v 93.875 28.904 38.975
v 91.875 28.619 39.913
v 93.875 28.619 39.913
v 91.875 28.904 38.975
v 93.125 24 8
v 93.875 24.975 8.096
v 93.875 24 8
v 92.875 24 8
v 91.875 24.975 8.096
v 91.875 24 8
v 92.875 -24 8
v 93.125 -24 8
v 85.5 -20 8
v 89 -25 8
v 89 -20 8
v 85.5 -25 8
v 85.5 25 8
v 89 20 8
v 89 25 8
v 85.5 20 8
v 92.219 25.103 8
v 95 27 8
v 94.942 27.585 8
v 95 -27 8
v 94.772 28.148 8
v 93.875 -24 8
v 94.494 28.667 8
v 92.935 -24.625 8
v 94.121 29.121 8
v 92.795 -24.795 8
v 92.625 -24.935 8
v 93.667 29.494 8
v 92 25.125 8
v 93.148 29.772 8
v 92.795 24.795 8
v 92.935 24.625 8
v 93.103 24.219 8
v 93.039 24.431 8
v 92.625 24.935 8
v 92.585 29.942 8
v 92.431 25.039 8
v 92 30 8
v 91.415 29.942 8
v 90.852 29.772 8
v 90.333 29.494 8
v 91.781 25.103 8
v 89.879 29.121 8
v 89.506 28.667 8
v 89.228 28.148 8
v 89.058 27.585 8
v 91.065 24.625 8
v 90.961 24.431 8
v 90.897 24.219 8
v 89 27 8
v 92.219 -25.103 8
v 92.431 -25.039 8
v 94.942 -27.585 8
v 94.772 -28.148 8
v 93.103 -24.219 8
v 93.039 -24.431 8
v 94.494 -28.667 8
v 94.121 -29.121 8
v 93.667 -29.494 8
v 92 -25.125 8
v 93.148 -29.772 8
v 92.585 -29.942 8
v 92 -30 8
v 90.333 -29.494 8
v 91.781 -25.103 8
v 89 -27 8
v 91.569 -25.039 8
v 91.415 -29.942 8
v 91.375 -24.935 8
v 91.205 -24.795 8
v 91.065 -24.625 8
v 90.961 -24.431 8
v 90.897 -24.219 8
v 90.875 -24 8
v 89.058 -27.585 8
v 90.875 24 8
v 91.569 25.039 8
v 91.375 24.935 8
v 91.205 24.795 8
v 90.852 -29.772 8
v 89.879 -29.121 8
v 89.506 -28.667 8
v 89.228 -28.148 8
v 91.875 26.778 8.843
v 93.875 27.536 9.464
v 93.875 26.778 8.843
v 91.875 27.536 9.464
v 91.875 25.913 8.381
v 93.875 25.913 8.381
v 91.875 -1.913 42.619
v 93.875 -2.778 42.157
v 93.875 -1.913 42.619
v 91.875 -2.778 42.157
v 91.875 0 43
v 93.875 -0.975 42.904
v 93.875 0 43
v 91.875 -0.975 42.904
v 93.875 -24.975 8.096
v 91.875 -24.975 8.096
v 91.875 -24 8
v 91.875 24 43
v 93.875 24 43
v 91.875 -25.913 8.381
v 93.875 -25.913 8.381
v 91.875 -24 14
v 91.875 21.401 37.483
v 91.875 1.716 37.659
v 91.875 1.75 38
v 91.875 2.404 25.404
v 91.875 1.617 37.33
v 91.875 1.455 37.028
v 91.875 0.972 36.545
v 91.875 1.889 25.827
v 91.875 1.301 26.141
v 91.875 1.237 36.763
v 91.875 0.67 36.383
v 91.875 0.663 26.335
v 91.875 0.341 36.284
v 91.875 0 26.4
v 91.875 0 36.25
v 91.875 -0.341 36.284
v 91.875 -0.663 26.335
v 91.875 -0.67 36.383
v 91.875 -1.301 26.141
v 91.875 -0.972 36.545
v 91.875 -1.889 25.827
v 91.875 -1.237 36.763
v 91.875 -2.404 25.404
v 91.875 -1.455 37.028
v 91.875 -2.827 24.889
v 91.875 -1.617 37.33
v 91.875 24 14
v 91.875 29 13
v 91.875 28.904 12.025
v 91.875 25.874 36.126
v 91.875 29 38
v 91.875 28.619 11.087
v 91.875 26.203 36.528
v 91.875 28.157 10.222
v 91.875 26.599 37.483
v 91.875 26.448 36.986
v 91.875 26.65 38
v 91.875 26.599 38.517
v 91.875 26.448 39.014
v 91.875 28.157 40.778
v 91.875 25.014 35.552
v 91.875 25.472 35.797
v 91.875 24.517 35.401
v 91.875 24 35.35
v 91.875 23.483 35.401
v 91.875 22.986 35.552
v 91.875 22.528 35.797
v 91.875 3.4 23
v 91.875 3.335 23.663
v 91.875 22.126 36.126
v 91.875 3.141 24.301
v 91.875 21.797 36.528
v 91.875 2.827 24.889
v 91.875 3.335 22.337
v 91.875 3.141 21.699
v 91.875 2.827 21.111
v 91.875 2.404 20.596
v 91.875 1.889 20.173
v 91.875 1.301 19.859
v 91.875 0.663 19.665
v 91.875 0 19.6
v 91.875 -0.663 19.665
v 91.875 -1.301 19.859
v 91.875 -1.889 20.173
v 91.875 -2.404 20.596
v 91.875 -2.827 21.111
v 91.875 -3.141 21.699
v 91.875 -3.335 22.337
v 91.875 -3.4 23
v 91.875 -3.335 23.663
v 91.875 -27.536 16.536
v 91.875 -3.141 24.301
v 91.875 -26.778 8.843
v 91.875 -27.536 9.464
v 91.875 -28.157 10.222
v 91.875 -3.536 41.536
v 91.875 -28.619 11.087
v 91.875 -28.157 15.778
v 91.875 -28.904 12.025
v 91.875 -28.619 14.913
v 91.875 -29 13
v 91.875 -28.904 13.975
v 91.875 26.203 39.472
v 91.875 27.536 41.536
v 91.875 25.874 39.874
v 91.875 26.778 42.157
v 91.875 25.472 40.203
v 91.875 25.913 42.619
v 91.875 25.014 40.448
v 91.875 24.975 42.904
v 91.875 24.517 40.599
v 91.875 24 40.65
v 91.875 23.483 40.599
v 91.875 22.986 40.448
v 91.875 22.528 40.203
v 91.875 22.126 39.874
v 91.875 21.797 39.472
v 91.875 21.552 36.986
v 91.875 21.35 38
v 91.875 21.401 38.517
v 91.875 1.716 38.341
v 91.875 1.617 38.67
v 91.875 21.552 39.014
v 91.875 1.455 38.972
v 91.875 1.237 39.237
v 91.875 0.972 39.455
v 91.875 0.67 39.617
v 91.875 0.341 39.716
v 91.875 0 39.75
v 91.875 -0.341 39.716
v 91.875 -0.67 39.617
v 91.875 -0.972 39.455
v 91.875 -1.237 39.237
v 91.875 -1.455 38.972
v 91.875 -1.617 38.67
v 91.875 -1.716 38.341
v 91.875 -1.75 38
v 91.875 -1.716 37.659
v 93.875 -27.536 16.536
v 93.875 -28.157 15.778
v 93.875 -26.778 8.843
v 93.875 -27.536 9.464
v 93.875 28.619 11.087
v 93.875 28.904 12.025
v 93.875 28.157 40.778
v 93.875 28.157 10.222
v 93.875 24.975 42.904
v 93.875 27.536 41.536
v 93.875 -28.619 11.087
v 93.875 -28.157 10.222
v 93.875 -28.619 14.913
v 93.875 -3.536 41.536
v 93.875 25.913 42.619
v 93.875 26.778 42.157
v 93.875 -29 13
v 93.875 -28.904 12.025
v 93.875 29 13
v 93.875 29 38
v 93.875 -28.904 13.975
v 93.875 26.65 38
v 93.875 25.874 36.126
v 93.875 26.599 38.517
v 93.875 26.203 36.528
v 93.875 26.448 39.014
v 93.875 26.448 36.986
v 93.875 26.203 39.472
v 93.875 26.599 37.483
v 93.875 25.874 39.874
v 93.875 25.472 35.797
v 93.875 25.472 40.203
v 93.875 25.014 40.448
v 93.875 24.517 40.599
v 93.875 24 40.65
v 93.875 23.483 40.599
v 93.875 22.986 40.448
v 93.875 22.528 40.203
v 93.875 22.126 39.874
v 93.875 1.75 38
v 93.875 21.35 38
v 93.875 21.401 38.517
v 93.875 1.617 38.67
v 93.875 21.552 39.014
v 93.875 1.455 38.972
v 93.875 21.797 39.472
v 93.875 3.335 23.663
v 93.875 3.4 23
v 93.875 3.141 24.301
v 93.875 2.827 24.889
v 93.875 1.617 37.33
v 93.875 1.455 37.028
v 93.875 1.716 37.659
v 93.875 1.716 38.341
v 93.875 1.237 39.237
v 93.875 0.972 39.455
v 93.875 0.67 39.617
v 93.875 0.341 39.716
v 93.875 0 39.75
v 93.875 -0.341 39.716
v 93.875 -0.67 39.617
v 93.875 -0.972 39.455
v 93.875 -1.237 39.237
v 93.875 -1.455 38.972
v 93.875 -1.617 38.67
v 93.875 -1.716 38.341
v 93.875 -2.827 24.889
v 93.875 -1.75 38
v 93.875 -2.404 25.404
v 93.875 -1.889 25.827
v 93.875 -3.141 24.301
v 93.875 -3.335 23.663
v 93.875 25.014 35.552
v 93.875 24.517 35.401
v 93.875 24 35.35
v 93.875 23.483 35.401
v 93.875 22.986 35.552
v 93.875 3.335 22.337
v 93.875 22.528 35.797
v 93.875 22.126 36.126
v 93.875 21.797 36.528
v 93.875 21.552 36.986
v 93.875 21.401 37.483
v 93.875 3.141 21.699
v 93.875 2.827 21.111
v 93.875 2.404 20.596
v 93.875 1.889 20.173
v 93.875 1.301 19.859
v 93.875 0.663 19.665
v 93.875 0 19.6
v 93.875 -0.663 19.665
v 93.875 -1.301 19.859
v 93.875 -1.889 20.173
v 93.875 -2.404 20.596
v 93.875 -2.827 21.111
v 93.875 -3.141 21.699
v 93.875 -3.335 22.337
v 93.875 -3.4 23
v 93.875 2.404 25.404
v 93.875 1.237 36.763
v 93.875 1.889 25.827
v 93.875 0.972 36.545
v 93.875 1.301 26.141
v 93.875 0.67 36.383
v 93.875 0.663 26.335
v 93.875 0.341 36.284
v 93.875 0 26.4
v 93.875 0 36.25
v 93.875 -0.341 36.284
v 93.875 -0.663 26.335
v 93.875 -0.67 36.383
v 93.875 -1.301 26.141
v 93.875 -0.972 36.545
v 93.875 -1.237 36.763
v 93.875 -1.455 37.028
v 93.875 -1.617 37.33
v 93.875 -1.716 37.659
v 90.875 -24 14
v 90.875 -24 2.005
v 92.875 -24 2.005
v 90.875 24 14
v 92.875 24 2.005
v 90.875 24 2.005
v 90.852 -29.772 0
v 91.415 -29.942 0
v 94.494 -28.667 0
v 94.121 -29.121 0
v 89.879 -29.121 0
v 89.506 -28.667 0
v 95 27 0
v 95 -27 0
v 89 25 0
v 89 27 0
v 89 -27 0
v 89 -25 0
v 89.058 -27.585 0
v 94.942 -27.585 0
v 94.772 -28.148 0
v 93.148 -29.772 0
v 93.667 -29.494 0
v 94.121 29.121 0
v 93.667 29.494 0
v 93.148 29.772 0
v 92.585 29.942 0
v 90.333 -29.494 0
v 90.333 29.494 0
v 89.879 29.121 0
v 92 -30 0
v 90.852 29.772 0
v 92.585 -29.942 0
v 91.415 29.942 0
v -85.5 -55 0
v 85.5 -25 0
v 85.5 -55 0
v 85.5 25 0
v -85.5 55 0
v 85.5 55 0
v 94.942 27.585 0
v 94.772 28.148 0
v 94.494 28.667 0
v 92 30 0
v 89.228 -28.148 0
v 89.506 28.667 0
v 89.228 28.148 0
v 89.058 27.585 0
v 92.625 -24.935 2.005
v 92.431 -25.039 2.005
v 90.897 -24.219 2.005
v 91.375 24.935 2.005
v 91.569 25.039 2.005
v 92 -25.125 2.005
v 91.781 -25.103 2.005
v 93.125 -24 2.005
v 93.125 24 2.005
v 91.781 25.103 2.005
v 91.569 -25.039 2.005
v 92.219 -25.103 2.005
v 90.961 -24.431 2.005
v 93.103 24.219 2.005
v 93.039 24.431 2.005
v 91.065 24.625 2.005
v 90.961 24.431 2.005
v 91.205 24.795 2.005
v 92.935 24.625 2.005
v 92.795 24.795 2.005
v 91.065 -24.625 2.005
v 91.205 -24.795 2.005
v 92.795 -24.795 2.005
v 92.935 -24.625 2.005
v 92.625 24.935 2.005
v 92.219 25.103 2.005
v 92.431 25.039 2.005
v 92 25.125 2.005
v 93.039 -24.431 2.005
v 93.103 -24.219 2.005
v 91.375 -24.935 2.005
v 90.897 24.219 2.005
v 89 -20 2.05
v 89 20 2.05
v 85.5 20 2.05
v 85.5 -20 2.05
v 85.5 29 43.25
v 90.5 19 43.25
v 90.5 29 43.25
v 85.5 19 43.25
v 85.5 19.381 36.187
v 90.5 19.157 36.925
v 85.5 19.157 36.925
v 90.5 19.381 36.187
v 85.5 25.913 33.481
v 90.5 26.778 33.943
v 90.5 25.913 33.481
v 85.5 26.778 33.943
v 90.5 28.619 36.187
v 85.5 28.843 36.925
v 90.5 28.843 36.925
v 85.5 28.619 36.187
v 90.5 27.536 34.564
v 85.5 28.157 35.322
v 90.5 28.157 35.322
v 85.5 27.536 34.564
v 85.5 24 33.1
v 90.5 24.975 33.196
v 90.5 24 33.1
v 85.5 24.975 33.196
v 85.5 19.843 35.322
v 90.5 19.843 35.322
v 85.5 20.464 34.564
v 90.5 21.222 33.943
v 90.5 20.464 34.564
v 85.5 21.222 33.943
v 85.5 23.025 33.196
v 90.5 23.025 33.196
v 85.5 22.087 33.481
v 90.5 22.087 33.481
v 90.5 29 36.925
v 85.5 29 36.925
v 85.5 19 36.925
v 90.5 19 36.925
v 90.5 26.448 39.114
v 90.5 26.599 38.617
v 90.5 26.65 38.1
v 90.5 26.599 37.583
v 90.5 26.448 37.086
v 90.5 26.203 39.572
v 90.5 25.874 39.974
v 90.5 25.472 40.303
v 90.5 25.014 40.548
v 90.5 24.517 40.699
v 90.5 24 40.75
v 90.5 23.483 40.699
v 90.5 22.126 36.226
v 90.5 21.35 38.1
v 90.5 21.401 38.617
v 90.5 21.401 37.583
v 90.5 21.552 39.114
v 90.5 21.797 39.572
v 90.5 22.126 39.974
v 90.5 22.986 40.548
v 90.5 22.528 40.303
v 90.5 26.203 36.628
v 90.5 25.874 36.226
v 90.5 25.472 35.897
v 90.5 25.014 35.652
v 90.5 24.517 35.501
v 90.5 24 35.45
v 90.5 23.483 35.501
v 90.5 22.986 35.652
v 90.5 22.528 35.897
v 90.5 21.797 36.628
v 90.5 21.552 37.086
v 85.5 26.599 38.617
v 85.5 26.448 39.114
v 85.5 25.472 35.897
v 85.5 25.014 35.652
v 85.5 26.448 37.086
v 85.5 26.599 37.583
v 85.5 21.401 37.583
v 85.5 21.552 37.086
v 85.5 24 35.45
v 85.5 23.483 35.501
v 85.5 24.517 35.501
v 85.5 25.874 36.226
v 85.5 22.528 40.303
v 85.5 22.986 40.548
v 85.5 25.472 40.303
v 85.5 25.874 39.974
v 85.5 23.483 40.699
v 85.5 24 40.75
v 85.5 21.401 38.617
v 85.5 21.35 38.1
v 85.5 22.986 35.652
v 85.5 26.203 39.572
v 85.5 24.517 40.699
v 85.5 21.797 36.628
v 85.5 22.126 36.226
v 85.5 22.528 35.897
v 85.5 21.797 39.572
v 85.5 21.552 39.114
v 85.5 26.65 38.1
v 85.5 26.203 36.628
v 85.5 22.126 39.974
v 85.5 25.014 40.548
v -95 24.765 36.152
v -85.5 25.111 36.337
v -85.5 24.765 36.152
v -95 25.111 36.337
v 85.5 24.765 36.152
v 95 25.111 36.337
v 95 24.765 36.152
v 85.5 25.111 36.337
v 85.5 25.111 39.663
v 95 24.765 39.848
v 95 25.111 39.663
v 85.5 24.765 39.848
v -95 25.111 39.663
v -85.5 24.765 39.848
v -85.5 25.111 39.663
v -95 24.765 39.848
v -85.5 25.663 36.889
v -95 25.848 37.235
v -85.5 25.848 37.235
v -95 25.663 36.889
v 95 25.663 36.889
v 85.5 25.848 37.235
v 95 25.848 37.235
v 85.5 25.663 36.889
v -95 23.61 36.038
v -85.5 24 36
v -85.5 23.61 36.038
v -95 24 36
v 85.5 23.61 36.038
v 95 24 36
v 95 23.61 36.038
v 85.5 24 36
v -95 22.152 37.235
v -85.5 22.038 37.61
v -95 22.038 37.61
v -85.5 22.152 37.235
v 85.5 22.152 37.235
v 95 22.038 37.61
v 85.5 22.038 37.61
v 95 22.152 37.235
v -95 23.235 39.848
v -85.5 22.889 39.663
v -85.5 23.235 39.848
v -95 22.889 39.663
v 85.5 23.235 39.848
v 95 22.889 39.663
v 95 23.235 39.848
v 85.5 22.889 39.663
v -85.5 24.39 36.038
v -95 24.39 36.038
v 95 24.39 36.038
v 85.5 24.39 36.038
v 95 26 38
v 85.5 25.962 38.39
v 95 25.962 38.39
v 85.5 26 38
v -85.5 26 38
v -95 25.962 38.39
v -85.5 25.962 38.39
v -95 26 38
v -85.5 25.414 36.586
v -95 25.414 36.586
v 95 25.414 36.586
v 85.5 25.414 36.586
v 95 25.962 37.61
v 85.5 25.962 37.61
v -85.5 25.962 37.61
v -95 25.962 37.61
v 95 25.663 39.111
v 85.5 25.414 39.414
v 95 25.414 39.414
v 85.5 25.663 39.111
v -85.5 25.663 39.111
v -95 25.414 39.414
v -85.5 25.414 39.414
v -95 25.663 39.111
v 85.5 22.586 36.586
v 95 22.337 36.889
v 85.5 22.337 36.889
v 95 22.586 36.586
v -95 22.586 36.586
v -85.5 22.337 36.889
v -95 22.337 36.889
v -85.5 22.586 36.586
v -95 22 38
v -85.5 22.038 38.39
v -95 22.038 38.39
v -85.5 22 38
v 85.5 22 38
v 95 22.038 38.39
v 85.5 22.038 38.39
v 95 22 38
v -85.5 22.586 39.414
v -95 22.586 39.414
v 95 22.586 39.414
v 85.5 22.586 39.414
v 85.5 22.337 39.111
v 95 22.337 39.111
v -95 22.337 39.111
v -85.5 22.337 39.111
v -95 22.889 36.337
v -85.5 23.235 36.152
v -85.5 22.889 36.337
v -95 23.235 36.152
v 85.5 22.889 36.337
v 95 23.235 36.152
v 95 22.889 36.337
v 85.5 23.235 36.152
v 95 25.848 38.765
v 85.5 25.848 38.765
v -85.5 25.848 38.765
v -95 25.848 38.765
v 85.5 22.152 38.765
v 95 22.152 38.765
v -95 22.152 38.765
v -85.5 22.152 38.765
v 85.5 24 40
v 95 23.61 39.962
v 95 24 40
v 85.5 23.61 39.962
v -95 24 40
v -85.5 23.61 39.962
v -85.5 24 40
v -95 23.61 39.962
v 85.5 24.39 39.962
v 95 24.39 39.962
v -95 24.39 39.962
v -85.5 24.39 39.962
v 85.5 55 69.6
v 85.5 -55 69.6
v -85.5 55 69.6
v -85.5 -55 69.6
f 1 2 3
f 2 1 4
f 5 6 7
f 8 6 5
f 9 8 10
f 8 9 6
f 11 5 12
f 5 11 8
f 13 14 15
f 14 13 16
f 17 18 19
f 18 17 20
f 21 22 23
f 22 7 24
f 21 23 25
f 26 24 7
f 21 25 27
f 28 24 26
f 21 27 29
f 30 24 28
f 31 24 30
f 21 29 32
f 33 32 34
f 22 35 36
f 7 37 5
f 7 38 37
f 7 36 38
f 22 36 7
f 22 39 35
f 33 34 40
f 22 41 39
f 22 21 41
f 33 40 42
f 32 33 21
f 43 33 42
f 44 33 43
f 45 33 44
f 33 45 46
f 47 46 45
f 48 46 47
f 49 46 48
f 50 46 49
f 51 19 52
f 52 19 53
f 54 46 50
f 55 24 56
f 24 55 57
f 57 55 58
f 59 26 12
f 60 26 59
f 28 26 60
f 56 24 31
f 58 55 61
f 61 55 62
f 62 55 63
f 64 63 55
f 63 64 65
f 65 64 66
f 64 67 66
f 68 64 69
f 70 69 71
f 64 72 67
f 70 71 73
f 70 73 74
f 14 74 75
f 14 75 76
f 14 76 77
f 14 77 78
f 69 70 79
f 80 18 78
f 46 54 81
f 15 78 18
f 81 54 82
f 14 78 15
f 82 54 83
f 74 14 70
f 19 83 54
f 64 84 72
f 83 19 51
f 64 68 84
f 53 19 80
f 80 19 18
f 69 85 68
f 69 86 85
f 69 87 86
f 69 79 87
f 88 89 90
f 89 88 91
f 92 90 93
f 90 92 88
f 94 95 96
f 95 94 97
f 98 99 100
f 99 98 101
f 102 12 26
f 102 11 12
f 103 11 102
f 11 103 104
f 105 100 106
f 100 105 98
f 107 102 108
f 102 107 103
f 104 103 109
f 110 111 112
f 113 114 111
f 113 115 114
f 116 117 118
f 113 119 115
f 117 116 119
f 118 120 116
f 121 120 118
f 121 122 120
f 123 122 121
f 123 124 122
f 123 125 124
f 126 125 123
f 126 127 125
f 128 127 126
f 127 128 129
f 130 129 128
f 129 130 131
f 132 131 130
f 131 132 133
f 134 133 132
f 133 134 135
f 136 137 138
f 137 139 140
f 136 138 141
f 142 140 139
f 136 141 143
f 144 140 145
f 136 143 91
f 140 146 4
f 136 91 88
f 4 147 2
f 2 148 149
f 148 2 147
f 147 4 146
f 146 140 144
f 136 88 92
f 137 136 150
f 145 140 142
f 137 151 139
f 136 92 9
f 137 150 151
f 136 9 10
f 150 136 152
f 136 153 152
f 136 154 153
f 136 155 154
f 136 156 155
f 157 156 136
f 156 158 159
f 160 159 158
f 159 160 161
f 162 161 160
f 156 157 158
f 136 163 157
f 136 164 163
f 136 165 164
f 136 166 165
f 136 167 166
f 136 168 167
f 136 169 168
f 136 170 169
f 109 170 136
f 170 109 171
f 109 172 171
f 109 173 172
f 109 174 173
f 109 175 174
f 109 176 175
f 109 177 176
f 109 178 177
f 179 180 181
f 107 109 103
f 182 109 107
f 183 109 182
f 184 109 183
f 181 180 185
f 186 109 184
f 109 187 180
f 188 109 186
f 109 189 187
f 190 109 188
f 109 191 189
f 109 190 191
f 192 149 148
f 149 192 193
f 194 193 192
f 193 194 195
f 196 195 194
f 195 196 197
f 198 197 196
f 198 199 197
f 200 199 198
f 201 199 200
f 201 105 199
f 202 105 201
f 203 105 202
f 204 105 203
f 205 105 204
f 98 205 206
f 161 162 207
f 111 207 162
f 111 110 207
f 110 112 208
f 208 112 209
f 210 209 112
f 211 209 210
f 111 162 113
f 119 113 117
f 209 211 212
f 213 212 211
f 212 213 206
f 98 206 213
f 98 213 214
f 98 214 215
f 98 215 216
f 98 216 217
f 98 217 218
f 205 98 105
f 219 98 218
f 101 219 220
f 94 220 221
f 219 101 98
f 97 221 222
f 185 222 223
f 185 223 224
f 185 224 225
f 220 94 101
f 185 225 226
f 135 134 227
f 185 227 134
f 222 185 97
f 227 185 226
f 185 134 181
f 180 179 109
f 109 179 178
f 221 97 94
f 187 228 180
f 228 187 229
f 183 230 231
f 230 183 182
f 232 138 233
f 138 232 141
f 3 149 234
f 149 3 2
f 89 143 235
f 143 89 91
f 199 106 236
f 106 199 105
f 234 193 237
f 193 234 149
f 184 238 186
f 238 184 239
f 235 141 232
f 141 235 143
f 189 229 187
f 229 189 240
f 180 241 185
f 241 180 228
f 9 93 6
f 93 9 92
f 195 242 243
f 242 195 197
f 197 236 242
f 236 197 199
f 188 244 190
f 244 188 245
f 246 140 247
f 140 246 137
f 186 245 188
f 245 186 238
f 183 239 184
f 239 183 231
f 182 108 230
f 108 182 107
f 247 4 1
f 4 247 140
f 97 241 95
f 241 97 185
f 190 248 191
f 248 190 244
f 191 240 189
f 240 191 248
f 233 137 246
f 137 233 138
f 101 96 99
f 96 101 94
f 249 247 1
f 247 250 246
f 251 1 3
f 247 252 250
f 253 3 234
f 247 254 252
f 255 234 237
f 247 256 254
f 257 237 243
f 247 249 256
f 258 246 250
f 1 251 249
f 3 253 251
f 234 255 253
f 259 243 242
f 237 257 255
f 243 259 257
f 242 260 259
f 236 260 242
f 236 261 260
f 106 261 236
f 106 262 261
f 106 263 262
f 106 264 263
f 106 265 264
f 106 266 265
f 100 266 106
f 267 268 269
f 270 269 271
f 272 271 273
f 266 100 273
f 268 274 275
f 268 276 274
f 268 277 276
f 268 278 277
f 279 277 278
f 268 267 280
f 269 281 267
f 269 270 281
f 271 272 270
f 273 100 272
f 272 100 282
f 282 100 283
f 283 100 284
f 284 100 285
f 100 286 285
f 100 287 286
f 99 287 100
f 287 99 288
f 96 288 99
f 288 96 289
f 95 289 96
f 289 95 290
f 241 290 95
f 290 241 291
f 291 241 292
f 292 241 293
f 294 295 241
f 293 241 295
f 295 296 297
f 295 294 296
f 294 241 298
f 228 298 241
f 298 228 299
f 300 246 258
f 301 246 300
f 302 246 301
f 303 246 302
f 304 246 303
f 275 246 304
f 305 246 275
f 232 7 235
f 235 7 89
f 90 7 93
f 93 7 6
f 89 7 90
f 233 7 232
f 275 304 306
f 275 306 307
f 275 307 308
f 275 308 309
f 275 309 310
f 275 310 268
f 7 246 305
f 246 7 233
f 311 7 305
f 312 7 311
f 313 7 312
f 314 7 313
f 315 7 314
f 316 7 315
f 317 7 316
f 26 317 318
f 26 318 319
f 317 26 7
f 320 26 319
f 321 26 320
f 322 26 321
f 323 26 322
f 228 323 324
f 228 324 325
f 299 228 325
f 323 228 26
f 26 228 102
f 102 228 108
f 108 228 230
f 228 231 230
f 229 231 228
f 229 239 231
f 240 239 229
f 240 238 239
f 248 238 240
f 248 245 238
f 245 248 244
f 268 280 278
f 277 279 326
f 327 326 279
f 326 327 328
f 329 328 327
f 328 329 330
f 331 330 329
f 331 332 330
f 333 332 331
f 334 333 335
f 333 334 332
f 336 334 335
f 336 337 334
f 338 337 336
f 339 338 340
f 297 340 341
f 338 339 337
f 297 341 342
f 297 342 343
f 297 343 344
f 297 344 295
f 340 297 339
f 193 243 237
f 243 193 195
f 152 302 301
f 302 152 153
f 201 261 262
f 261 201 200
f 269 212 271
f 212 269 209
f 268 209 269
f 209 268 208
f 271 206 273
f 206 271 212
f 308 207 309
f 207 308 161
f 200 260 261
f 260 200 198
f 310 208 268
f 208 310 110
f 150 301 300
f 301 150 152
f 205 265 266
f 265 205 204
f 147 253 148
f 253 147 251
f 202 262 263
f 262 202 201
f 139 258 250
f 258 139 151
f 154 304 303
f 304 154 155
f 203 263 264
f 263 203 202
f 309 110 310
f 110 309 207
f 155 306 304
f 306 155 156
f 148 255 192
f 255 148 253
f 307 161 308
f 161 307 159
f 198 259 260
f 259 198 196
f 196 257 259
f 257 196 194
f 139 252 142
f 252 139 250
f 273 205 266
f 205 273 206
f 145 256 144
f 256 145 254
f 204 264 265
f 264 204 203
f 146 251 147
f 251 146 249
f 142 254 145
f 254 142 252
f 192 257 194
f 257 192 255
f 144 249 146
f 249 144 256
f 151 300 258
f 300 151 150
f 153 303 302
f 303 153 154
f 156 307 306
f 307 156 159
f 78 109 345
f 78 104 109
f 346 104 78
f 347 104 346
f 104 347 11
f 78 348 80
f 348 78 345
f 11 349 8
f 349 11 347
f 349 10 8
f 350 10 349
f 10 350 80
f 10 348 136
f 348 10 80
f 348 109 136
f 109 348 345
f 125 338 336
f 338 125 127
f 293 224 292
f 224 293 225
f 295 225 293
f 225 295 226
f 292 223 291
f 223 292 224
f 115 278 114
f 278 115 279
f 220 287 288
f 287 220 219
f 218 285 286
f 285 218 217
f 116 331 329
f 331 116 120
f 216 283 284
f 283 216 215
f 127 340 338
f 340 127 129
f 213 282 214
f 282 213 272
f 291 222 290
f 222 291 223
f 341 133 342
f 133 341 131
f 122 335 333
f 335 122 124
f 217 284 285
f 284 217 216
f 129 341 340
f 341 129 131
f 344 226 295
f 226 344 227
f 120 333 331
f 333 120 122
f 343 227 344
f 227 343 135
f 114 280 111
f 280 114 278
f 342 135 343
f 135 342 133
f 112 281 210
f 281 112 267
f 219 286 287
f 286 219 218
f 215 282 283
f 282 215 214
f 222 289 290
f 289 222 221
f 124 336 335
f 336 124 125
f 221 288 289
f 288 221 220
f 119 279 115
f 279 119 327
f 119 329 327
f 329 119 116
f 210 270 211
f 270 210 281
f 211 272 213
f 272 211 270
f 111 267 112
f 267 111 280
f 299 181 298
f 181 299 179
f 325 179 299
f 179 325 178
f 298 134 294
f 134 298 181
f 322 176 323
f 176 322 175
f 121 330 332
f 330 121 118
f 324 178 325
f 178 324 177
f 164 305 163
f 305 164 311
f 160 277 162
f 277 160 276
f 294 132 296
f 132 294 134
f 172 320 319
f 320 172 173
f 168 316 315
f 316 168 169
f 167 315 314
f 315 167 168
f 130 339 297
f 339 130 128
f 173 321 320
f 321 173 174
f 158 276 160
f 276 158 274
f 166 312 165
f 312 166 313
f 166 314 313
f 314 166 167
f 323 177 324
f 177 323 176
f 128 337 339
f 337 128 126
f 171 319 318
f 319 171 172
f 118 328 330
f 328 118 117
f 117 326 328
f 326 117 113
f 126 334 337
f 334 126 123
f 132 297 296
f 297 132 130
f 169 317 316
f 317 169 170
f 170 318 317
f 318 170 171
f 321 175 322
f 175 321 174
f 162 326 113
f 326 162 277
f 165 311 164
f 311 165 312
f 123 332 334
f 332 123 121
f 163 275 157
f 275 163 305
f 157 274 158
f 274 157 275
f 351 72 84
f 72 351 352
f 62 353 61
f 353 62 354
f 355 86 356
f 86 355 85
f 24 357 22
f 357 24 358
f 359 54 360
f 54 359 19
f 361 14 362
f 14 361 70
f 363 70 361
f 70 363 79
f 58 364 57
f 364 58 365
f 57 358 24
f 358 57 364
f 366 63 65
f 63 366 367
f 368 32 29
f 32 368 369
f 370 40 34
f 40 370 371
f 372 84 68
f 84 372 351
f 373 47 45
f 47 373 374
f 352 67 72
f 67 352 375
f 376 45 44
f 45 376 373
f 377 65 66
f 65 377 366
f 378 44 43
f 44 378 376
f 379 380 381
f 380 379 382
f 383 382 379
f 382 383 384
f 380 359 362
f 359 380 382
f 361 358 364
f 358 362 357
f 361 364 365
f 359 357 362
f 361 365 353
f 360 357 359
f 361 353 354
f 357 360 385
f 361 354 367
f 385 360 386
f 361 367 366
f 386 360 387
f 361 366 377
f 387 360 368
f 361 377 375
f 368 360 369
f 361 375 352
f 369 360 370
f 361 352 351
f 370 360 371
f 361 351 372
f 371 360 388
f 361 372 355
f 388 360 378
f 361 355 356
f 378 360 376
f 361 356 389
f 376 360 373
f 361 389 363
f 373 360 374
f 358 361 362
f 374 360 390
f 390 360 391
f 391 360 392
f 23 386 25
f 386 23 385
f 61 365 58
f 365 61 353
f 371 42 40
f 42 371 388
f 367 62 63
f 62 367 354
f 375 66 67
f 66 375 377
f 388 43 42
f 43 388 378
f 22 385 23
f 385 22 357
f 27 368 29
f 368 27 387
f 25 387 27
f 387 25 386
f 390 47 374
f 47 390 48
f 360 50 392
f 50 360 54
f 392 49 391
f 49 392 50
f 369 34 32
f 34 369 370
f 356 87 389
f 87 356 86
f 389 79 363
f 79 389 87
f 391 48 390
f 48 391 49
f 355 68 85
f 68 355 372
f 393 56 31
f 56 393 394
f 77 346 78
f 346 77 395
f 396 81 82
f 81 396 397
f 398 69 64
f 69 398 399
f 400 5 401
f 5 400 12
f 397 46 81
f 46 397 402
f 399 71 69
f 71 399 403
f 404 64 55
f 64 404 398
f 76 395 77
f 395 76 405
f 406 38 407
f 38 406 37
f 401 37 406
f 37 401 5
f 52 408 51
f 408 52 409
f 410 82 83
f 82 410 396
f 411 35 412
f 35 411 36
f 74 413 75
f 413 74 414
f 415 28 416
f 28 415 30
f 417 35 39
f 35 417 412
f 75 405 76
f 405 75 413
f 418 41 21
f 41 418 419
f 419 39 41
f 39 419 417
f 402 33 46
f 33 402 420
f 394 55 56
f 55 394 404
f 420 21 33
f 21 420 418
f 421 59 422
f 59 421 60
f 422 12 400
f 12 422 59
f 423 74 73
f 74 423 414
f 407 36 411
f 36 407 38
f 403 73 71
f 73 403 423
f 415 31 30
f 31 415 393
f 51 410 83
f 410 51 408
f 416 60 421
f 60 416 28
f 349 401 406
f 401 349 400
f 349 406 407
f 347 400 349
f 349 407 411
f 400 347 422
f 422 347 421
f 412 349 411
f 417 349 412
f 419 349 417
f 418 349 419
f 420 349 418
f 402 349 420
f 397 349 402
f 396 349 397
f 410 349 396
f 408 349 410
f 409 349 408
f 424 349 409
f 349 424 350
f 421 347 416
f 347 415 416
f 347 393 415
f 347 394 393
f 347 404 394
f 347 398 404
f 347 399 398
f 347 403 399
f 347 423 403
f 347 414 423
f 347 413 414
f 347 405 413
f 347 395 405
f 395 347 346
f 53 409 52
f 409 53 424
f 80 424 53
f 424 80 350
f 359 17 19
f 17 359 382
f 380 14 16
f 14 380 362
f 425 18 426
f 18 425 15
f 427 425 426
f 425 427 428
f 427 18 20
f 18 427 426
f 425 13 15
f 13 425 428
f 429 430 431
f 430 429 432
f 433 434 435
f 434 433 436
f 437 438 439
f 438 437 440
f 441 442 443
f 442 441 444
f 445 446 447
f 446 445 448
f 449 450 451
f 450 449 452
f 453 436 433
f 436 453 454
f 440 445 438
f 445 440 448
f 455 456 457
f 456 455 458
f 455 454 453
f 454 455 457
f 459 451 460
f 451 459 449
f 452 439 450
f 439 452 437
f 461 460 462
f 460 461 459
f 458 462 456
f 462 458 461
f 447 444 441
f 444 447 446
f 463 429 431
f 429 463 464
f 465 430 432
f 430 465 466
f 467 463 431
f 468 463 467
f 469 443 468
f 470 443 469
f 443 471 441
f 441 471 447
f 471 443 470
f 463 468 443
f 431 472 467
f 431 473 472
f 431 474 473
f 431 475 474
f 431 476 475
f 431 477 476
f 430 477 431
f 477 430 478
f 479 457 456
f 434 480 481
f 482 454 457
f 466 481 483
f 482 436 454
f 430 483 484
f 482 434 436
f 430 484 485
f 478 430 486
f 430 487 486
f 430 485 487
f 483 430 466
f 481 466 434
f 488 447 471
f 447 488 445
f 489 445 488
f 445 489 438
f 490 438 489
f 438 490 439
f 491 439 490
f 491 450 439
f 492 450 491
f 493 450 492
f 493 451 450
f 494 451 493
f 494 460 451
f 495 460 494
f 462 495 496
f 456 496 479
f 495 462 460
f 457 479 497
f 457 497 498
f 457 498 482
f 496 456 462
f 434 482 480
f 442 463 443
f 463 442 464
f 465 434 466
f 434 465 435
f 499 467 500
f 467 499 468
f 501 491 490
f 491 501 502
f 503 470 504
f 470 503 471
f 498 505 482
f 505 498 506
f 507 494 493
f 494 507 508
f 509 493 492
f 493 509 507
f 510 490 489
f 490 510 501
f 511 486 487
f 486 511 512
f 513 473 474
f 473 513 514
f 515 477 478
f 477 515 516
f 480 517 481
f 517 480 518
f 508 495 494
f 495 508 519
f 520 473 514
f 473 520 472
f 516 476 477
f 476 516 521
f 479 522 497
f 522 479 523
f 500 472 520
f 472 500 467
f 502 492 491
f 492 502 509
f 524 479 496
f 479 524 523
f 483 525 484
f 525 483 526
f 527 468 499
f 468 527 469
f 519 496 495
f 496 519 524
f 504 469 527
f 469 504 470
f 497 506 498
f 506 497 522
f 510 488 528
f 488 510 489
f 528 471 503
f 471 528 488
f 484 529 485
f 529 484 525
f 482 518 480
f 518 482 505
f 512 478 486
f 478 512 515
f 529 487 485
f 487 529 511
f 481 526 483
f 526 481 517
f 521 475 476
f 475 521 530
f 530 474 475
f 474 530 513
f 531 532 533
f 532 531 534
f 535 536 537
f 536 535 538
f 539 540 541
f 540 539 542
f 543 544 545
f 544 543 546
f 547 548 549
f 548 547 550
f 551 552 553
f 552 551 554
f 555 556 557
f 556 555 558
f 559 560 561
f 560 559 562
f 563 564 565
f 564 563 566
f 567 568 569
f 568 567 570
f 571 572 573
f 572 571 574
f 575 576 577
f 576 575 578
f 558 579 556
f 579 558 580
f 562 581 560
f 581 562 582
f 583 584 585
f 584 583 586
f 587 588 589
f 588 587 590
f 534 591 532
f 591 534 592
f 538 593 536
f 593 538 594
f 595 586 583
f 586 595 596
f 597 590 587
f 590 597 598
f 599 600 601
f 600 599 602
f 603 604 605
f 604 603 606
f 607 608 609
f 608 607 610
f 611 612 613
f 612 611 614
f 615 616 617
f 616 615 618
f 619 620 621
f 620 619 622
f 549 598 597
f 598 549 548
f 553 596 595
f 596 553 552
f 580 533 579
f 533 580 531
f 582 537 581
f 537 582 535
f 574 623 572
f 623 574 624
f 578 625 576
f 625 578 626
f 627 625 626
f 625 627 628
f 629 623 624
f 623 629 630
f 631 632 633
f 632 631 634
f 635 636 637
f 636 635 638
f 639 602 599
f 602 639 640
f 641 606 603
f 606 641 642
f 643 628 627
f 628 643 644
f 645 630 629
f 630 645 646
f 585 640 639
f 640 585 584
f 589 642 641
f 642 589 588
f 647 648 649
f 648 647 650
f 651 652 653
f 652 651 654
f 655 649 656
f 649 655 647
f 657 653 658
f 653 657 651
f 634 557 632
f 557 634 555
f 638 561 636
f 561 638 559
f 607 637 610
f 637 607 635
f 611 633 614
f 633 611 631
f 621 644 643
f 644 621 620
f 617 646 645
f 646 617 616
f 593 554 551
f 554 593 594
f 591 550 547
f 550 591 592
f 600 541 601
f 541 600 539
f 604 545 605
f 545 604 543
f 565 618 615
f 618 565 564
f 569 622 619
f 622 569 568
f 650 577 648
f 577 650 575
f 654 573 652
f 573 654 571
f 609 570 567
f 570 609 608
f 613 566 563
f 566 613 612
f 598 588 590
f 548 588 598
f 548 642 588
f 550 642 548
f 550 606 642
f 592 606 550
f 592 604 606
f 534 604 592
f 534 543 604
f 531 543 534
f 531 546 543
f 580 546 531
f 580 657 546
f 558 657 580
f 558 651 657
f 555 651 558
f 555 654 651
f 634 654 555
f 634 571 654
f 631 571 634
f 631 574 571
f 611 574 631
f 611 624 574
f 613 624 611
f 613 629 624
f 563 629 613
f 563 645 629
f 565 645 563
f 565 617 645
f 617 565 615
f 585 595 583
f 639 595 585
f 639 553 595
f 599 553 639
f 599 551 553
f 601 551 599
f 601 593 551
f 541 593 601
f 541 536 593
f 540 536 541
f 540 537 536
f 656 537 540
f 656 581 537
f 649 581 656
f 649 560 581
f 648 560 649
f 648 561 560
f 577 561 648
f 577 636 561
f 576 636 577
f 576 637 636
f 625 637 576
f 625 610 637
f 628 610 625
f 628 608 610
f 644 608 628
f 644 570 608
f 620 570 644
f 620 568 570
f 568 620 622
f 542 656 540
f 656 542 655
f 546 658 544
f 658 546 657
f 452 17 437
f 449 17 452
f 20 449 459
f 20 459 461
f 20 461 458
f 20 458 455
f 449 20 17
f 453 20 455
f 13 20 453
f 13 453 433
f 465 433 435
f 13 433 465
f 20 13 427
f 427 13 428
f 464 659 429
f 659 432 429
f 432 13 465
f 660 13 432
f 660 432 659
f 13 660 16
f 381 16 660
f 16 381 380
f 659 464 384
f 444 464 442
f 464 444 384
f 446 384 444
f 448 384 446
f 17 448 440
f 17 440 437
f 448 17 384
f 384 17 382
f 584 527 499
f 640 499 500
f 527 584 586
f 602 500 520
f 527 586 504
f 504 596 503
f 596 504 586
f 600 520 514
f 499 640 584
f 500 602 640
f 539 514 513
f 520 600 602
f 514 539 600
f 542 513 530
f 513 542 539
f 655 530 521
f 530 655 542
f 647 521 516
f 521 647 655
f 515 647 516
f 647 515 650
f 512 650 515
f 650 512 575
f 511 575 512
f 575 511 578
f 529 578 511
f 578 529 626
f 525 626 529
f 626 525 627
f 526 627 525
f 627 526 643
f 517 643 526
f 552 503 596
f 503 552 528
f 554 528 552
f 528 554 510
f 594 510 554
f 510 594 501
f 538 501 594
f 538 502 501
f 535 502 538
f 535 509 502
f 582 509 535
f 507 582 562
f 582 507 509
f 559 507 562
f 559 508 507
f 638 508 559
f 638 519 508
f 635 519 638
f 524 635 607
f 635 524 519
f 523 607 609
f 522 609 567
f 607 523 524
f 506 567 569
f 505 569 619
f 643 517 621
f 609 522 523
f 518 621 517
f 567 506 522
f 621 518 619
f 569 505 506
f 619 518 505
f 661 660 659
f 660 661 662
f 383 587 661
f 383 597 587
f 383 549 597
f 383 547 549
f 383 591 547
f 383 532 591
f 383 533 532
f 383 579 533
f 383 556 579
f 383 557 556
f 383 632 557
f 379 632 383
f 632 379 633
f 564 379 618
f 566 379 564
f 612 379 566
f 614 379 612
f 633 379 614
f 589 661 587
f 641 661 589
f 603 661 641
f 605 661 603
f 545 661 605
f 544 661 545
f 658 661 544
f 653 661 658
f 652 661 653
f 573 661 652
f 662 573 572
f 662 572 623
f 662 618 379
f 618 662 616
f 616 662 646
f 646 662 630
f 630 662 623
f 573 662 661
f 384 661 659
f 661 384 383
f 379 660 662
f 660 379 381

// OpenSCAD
/* 
    electronic modules chassis
    
*/

//variables for the chassis
plat_width=140;//mm
plat_length=100;//mm
plat_thickness=2.5;//mm
peg_pitch=25;//mm
rail_slot_vgap=1.5 + 0.3;//mm
rail_length=40;//mm
hinge_dia=10;//mm
hinge_hole_dia=5.3;//mm
hinge_y_offset=24;//mm
hinge_height = 25;//mm
antenna_wall_extent=89;//mm
antenna_wall_socket_length = 54;//mm
antenna_wall_socket_slot_length=48;//mm

connector_wall_extent=79;//mm
connector_wall_socket_length = 70;//mm
connector_wall_socket_slot_length=60;//mm

wall_socket_width=6;//mm
wall_socket_height = 8;//mm
wall_socket_slot_width=2.25;//mm
wall_socket_slot_depth=6;//mm

east_west_western_peg_holes=[
    [18.7, 4.3], //1
    [18.7, 30.0],//2    30 - 4.3 = 25.7 pitch, 22.1 board
    [18.7, 71.6],//3    71.6 - 30 = 41.6 pitch, 38.0 board
    [18.7, 95.2] //4    95.2 - 71.6 = 23.6 pitch, 20.0 board
];
north_south_southern_peg_holes=[
    [60.4, 18.7],   //5  
    [102, 18.7],    //6  102 - 60.4 = 41.6 pitch, 38.0 board
    [135.3, 18.7],  //7  135.3 - 102 = 33.3 pitch, 29.7 board
    [56.7, 62.5],   //8 
    [135.3, 62.5],  //9  135.3 - 56.7 = 78.6 pitch, 75.0 board
];


base_major_thickness = 2;//mm
base_minor_thickness = 1;//mm
outer_frame_width = 150;//mm
frame_width = outer_frame_width - (base_major_thickness/2);//mm
peg_length = 2.5;//mm
base_width = 50;//mm

wall_corner_dia = 10;//mm
wall_thickness = 2;//mm
wall_plug_depth = 6;//mm
wall_hinge_offset = 24;//mm

antenna_wall_north_base_width = 24;//mm
antenna_wall_south_base_width = 24;//mm
antenna_wall_north_top_width = 0;//mm
antenna_wall_south_top_width = 24;//mm
antenna_wall_height = 25;//mm

connector_wall_north_base_width = 25;//mm
connector_wall_south_base_width = 25;//mm
connector_wall_north_top_width = 40;//mm
connector_wall_south_top_width = 40;//mm
connector_wall_height = 47;//mm

toggle_hole_dia = 12.5;//mm
toggle_spacing = 50;//mm

antenna_hole_dia = 6.8;//mm
antenna_hole_offset = 15;//mm
led_hole_dia = 3.5;//mm
led_hole_offset = 30;

//variables for the assembled model
box_inner_width = 170;//mm
box_inner_length = 70;//mm
box_inner_depth = 55;//mm
term_block_num_terms = 12;
term_block_pitch = 8.2;//mm
term_block_hole_dia = 2.75;//mm
terminal_dim = 6;//mm
terminal_length = 16;//mm

//supplementary components
module lid() {
    difference() {
        cube([200, 120, 15], center=true);
        translate([0, 0, 5]) cube([190, 72, 10], center=true);
        translate([0, 0, 5]) cube([170, 110, 10], center=true);
    }
}
module box() {
    translate([0, 0, 69.6/2]) difference() {
        cube([199-28, 110, 69.6], center=true);
    }
}
module terminal(term_dim, term_length) {
    difference() {
        union() {
            //body
            cube([term_dim, term_length, term_dim], center=true);
            //screws
            translate([0, term_dim/2, term_dim/2]) cylinder(h=term_dim/2, d=term_dim/2, $fn=32, center=true);
            translate([0, -term_dim/2, term_dim/2]) cylinder(h=term_dim/2, d=term_dim/2, $fn=32, center=true);
        }
        //cable hole
        rotate([90, 0, 0]) cylinder(h=term_length*2, d=term_dim/2, $fn=32, center=true);

    }    
}
module bridge(term_width, term_length, hole_dia) {
    difference() {
        cube([term_width/2, term_width, term_width], center=true);
        //fixing hole
        rotate([0, 0, 90]) cylinder(h=term_length*2, d=hole_dia, $fn=32, center=true);
    }
}
module terminal_block(num_terms=12, pitch=8, term_dim=6, term_length=16, term_fix_hole_dia=2.75) {
    translate([-(pitch * num_terms/2) + pitch/2, 0, 0]) {
        for (t=[0:1:num_terms-1]) {
            translate([t * pitch, 0, 0]) terminal(term_dim, term_length);
        }
        for (t=[0:1:num_terms-2]) {
            translate([(pitch/2) + t * pitch, 0, 0]) bridge(term_dim, term_length, term_fix_hole_dia);
        }
    }
}
module spindle() {
    rotate([0, 90, 0]) cylinder(h=190, d=4, $fn=32, center=true);
}
//main components
module rail(slot_vgap, peg_length, peg_pitch, length) {
    rail_dim = 3 * slot_vgap;//rail | gap | rail
    difference() {
        cube([rail_dim, length, rail_dim], center=true);
        translate([0, 0, slot_vgap]) {
            rotate([90, 0, 0]) cylinder(h=length + 0.1, d=slot_vgap, $fn=32, center=true);
            translate([0, 0, slot_vgap/2]) cube([slot_vgap, length + 0.1, slot_vgap], center=true);
            //lead-in
            translate([0, -length/2, 0]) rotate([90, 0, 0]) cylinder(h=5, d1=slot_vgap, d2=slot_vgap*2, $fn=32, center=true);
            translate([0, length/2, 0]) rotate([90, 0, 0]) cylinder(h=5, d2=slot_vgap, d1=slot_vgap*2, $fn=32, center=true);
        }
        translate([0, 0, -slot_vgap]) {
            rotate([90, 0, 0]) cylinder(h=length + 0.1, d=slot_vgap, $fn=32, center=true);
            translate([0, 0, -slot_vgap/2]) cube([slot_vgap, length + 0.1, slot_vgap], center=true);
            //lead-in
            translate([0, -length/2, 0]) rotate([90, 0, 0]) cylinder(h=5, d1=slot_vgap, d2=slot_vgap*2, $fn=32, center=true);
            translate([0, length/2, 0]) rotate([90, 0, 0]) cylinder(h=5, d2=slot_vgap, d1=slot_vgap*2, $fn=32, center=true);
        }
    }
    //pegs
    translate([(rail_dim + peg_length)/2, peg_pitch/2, 0]) rotate([0, 90, 0]) cylinder(h=peg_length, d=rail_dim, $fn=4, center=true);
    translate([(rail_dim + peg_length)/2, -peg_pitch/2, 0]) rotate([0, 90, 0]) cylinder(h=peg_length, d=rail_dim, $fn=4, center=true);
}
module platform(
    width, 
    length, 
    thickness, 
    east_west_western_peg_holes, 
    north_south_southern_peg_holes, 
    peg_pitch, 
    slot_vgap, 
    rail_length, 
    hinge_dia, 
    hinge_hole_dia, 
    hinge_y_offset, 
    ant_extent, 
    conn_extent, 
    socket_width
    ) {
    rail_dim = 3 * slot_vgap;//rail | gap | rail
    rail_dim_clearance = rail_dim + 0.325;
    peg_hole_dia = rail_dim_clearance;
    
    difference() {
        union() {
            //platform
            cube([width, length, thickness], center=true);
            //antenna hinge
            translate([-ant_extent/2, hinge_y_offset, -(hinge_hole_dia + thickness)/2]) rotate([0, 90, 0]) cylinder(h=ant_extent + (socket_width/2), d=hinge_dia, $fn=32, center=true);
            translate([-ant_extent/2, hinge_y_offset, -thickness]) cube([ant_extent + (socket_width/2), hinge_dia, thickness], center=true);
            translate([-width/2, hinge_y_offset - (hinge_dia/2), -thickness/2])  mirror([1,0,0]) cube([ant_extent + (socket_width/4) - (width/2), hinge_dia, thickness], center=false);
            //connector hinge
            translate([conn_extent/2, hinge_y_offset, -(hinge_hole_dia + thickness)/2]) rotate([0, 90, 0]) cylinder(h=conn_extent + (socket_width/2), d=hinge_dia, $fn=32, center=true);
            translate([conn_extent/2, hinge_y_offset, -thickness]) cube([conn_extent + (socket_width/2), hinge_dia, thickness + (hinge_hole_dia/2)], center=true);
            translate([width/2, hinge_y_offset - (hinge_dia/2), -thickness/2]) cube([conn_extent + (socket_width/4) - (width/2), hinge_dia, thickness], center=false);
        }
        //hinge holes
        translate([width/2, hinge_y_offset, -(hinge_hole_dia + thickness)/2]) rotate([0, 90, 0]) cylinder(h=width/4, d=hinge_hole_dia, $fn=32, center=true);
        translate([-conn_extent, hinge_y_offset, -(hinge_hole_dia + thickness)/2]) rotate([0, 90, 0]) cylinder(h=width/4, d=hinge_hole_dia, $fn=32, center=true);
        //peg holes
        translate([-width/2, -length/2,0]) {
            //east-west peg holes
            for (p = [ 0 : len(east_west_western_peg_holes) - 1 ]) 
            {
                west_pt=east_west_western_peg_holes[p];
                translate(west_pt) {
                    //hole
                    cylinder(h=thickness+0.1, d=peg_hole_dia, $fn=4, center=true);
                    //lead-in
                    translate([0, 0, thickness/2]) cylinder(h=thickness/2, d1=peg_hole_dia, d2=peg_hole_dia * 1.5, $fn=4, center=true);
                    //hole
                    translate([peg_pitch, 0, 0]) cylinder(h=thickness+0.1, d=peg_hole_dia, $fn=4, center=true);
                    //lead-in
                    translate([peg_pitch, 0, thickness/2]) cylinder(h=thickness/2, d1=peg_hole_dia, d2=peg_hole_dia * 1.5, $fn=4, center=true);
                    *translate([peg_pitch/2, 0, (thickness - 0.5 + 0.1)/2]) cube([rail_length + 0.5, rail_dim, 0.5], center=true);
                    *translate([peg_pitch/2, rail_dim, (thickness - rail_sink + 0.1)/2]) text(str(p + 1), size=10, halign="center", valign="bottom");
                }
            }
            //north-south peg holes
            for (q = [ 0 : len(north_south_southern_peg_holes) - 1 ]) 
            {
                south_pt=north_south_southern_peg_holes[q];
                translate(south_pt) {
                    //hole
                    cylinder(h=thickness+0.1, d=peg_hole_dia, $fn=4, center=true);
                    //lead-in
                    translate([0, 0, thickness/2]) cylinder(h=thickness/2, d1=peg_hole_dia, d2=peg_hole_dia * 1.5, $fn=4, center=true);
                    //hole
                    translate([0, peg_pitch, 0]) cylinder(h=thickness+0.1, d=peg_hole_dia, $fn=4, center=true);
                    //lead-in
                    translate([0, peg_pitch, thickness/2]) cylinder(h=thickness/2, d1=peg_hole_dia, d2=peg_hole_dia * 1.5, $fn=4, center=true);
                    *translate([0, peg_pitch/2, (thickness - 0.5 + 0.1)/2]) cube([rail_dim, rail_length + 0.5, 0.5], center=true);
                    *translate([rail_dim, peg_pitch/2, (thickness - rail_sink + 0.1)/2]) text(str(len(east_west_eastern_peg_holes) + q + 1), size=10, halign="center", valign="center");
                }
            }
        }
    }
}
module wall(
    north_base_width, 
    south_base_width,
    north_top_width, 
    south_top_width, 
    height, 
    corner_dia,
    thickness, 
    plug_depth,
    hinge_height,
    hinge_offset
) {
    width = north_base_width + south_base_width;
    translate([0, corner_dia/2, 0]) {
        difference() {
            hull() {
                //north base
                translate([north_base_width, 0, 0]) cylinder(h=thickness, d=corner_dia, $fn=32, center=true);
                //south base
                translate([-south_base_width, 0, 0]) cylinder(h=thickness, d=corner_dia, $fn=32, center=true);
                //north top
                translate([north_top_width, height, 0]) cylinder(h=thickness, d=corner_dia, $fn=32, center=true);
                //south top
                translate([-south_top_width, height, 0]) cylinder(h=thickness, d=corner_dia, $fn=32, center=true);
            }
            //hinge hole
            translate([-hinge_offset, hinge_height, 0]) cylinder(h=thickness*2, d=5.3, $fn=32, center=true);
        }
   }
    //overlapping plug
    translate([(width/2)-south_base_width, 0, thickness/2]) cube([width, plug_depth*2, thickness], center=true);
}
module antenna_wall(
    north_base_width,
    south_base_width,
    north_top_width,
    south_top_width,
    height,
    corner_dia, 
    thickness,
    plug_depth,
    hinge_height,
    hinge_offset
) {
    difference() {
        wall(
            north_base_width, 
            south_base_width,
            north_top_width, 
            south_top_width, 
            height,
            corner_dia,
            thickness, 
            plug_depth,
            hinge_height,
            hinge_offset
        );
        //led hole
        translate([0, led_hole_offset, 0]) cylinder(h=thickness*2, d=led_hole_dia, $fn=32, center=true);
        //antenna hole
        translate([0, antenna_hole_offset, 0]) cylinder(h=thickness*2, d=antenna_hole_dia, $fn=32, center=true);
    }
}
module holes(term_dim) {
    //centered terminal block peg holes
    cylinder(h=term_dim, d1=term_block_hole_dia, d2=term_block_hole_dia-0.5, $fn=64, center=true);
    for (t=[0:1:(term_block_num_terms-2)/2]) {
            translate([t * term_block_pitch, 0, 0]) cylinder(h=term_dim, d=term_block_hole_dia, $fn=64, center=true);
            translate([-(t * term_block_pitch), 0, 0]) cylinder(h=term_dim, d=term_block_hole_dia, $fn=64, center=true);
    }
}
module connector_wall(
    north_base_width=32,
    south_base_width=32,
    north_top_width=32,
    south_top_width=32,
    height=25,
    corner_dia=10, 
    thickness=2,
    plug_depth=6,
    hinge_height=25,
    hinge_offset=32
) {
    difference() {
        wall(
            north_base_width, 
            south_base_width,
            north_top_width, 
            south_top_width, 
            height, 
            corner_dia,
            thickness, 
            plug_depth,
            hinge_height,
            hinge_offset
        );
        translate([0, height + corner_dia/2, 0]) holes(terminal_dim);
    }
}
module socket(
    width, 
    length, 
    height, 
    slot_width, 
    slot_length, 
    slot_depth
) {
    difference() {
        hull() {
            translate([0, -length/2, 0]) cylinder(h=height, d=width, $fn=32, center=true);
            translate([0, length/2, 0]) cylinder(h=height, d=width, $fn=32, center=true);
        }
        translate([0, 0, (height - slot_depth + 0.01)/2]) {
            hull() {
                translate([0, -slot_length/2, 0]) cylinder(h=slot_depth, d=slot_width, $fn=32, center=true);
                translate([0, slot_length/2, 0]) cylinder(h=slot_depth, d=slot_width, $fn=32, center=true);
            }
        }
    }
}
module base(ant_extent, conn_extent, base_width, socket_height, socket_width, hinge_height, major_thickness, minor_thickness) {
    difference() {
        union() {
            //antenna
            translate([ant_extent/2, 0, socket_height/2]) cube([ant_extent, base_width, socket_height], center=true);
            //connector
            translate([-conn_extent/2, 0, socket_height/2]) cube([conn_extent, base_width, socket_height], center=true);
            //sockets
            translate([ant_extent + (socket_width/2), 0, socket_height/2]) socket(
                wall_socket_width, 
                antenna_wall_socket_length, 
                wall_socket_height, 
                wall_socket_slot_width, 
                antenna_wall_socket_slot_length, 
                wall_socket_slot_depth
            );
            translate([-(conn_extent + (socket_width/2)), 0, socket_height/2]) socket(
                wall_socket_width, 
                connector_wall_socket_length, 
                wall_socket_height, 
                wall_socket_slot_width, 
                connector_wall_socket_slot_length, 
                wall_socket_slot_depth
            );
        }
        //cutouts
        translate([ant_extent/2, 0, (socket_height + 2.1)/2]) cube([ant_extent, base_width - 10, socket_height - 2], center=true);
        translate([-conn_extent/2, 0, (socket_height + 2.1)/2]) cube([conn_extent, base_width - 10, socket_height - 2], center=true);
        //toggle switches
        cylinder(h=major_thickness*9, d=toggle_hole_dia, $fn=32, center=true);
        translate([toggle_spacing, 0, 0]) cylinder(h=major_thickness*9, d=toggle_hole_dia, $fn=32, center=true);
        translate([-toggle_spacing, 0, 0]) cylinder(h=major_thickness*9, d=toggle_hole_dia, $fn=32, center=true);
        //toggle recesses
        translate([0, 0, (3*major_thickness/4)+0.1]) cylinder(h=major_thickness/2, d=toggle_hole_dia*3, $fn=32, center=true);
        translate([toggle_spacing, 0, (3*major_thickness/4)+0.1]) cylinder(h=major_thickness/2, d=toggle_hole_dia*3, $fn=32, center=true);
        translate([-toggle_spacing, 0, (3*major_thickness/4)+0.1]) cylinder(h=major_thickness/2, d=toggle_hole_dia*3, $fn=32, center=true);
    }
}
module assembly() {
    //antenna wall
    translate([antenna_wall_extent + wall_thickness + (wall_socket_width/2) - (wall_socket_slot_width/2), 0, wall_socket_height]) rotate([90, 0, 270]) antenna_wall(
        antenna_wall_north_base_width,
        antenna_wall_south_base_width,
        antenna_wall_north_top_width,
        antenna_wall_south_top_width,
        antenna_wall_height,
        wall_corner_dia, 
        wall_thickness,
        wall_plug_depth,
        hinge_height,
        wall_hinge_offset
    );
    //connector wall
    translate([-(connector_wall_extent + wall_thickness), 0, wall_socket_height]) rotate([90, 0, 270]) connector_wall(
        connector_wall_north_base_width,
        connector_wall_south_base_width,
        connector_wall_north_top_width,
        connector_wall_south_top_width,
        connector_wall_height,
        wall_corner_dia, 
        wall_thickness,
        wall_plug_depth,
        hinge_height,
        wall_hinge_offset        
    );
    base(
        antenna_wall_extent, 
        connector_wall_extent, 
        base_width, 
        wall_socket_height, 
        wall_socket_width, 
        hinge_height,
        base_major_thickness,
        base_minor_thickness
    );
    color("white") translate([-(connector_wall_extent - wall_thickness), 0, connector_wall_height + (wall_corner_dia/2) + wall_socket_height]) rotate([90, 0, 90]) terminal_block(); 
    translate([0, 24, hinge_height + wall_socket_height + 5]) spindle();
    color("grey", alpha=0.5) translate([10, 0, hinge_height + wall_socket_height + 9]) platform(
        plat_width, 
        plat_length, 
        plat_thickness, 
        east_west_western_peg_holes,
        north_south_southern_peg_holes, 
        peg_pitch, 
        rail_slot_vgap, 
        rail_length, 
        hinge_dia, 
        hinge_hole_dia, 
        hinge_y_offset, 
        antenna_wall_extent, 
        connector_wall_extent, 
        wall_socket_width
    );
    %lid();
    color("white", alpha=0.25) box();
    
    //toggle switches
    translate([0, 0, 16]) cube([25, 35, 32], center=true);
    
}
//complete assembly - uncomment only for visualisation
assembly();

//print configurations - uncomment to generate print files
//walls - print together using support touching buildplate
*antenna_wall(
    antenna_wall_north_base_width,
    antenna_wall_south_base_width,
    antenna_wall_north_top_width,
    antenna_wall_south_top_width,
    antenna_wall_height,
    wall_corner_dia, 
    wall_thickness,
    wall_plug_depth,
    hinge_height,
    wall_hinge_offset
);
*translate([0, -14, 0]) mirror([0, 1, 0]) {
    connector_wall(
        connector_wall_north_base_width,
        connector_wall_south_base_width,
        connector_wall_north_top_width,
        connector_wall_south_top_width,
        connector_wall_height,
        wall_corner_dia, 
        wall_thickness,
        wall_plug_depth,
        hinge_height,
        wall_hinge_offset        
    );
}
//base
*base(
    antenna_wall_extent, 
    connector_wall_extent, 
    base_width, 
    wall_socket_height, 
    wall_socket_width, 
    hinge_height,
    base_major_thickness,
    base_minor_thickness
);

//rail - print in this orientation, no support - 9off
*rail(rail_slot_vgap, peg_length, peg_pitch, rail_length);

//platform - print upside down to avoid support
*rotate([180, 0, 0]) {
    platform(
        plat_width, 
        plat_length, 
        plat_thickness, 
        east_west_western_peg_holes,
        north_south_southern_peg_holes, 
        peg_pitch, 
        rail_slot_vgap, 
        rail_length, 
        hinge_dia, 
        hinge_hole_dia, 
        hinge_y_offset, 
        antenna_wall_extent, 
        connector_wall_extent, 
        wall_socket_width
    );
}
